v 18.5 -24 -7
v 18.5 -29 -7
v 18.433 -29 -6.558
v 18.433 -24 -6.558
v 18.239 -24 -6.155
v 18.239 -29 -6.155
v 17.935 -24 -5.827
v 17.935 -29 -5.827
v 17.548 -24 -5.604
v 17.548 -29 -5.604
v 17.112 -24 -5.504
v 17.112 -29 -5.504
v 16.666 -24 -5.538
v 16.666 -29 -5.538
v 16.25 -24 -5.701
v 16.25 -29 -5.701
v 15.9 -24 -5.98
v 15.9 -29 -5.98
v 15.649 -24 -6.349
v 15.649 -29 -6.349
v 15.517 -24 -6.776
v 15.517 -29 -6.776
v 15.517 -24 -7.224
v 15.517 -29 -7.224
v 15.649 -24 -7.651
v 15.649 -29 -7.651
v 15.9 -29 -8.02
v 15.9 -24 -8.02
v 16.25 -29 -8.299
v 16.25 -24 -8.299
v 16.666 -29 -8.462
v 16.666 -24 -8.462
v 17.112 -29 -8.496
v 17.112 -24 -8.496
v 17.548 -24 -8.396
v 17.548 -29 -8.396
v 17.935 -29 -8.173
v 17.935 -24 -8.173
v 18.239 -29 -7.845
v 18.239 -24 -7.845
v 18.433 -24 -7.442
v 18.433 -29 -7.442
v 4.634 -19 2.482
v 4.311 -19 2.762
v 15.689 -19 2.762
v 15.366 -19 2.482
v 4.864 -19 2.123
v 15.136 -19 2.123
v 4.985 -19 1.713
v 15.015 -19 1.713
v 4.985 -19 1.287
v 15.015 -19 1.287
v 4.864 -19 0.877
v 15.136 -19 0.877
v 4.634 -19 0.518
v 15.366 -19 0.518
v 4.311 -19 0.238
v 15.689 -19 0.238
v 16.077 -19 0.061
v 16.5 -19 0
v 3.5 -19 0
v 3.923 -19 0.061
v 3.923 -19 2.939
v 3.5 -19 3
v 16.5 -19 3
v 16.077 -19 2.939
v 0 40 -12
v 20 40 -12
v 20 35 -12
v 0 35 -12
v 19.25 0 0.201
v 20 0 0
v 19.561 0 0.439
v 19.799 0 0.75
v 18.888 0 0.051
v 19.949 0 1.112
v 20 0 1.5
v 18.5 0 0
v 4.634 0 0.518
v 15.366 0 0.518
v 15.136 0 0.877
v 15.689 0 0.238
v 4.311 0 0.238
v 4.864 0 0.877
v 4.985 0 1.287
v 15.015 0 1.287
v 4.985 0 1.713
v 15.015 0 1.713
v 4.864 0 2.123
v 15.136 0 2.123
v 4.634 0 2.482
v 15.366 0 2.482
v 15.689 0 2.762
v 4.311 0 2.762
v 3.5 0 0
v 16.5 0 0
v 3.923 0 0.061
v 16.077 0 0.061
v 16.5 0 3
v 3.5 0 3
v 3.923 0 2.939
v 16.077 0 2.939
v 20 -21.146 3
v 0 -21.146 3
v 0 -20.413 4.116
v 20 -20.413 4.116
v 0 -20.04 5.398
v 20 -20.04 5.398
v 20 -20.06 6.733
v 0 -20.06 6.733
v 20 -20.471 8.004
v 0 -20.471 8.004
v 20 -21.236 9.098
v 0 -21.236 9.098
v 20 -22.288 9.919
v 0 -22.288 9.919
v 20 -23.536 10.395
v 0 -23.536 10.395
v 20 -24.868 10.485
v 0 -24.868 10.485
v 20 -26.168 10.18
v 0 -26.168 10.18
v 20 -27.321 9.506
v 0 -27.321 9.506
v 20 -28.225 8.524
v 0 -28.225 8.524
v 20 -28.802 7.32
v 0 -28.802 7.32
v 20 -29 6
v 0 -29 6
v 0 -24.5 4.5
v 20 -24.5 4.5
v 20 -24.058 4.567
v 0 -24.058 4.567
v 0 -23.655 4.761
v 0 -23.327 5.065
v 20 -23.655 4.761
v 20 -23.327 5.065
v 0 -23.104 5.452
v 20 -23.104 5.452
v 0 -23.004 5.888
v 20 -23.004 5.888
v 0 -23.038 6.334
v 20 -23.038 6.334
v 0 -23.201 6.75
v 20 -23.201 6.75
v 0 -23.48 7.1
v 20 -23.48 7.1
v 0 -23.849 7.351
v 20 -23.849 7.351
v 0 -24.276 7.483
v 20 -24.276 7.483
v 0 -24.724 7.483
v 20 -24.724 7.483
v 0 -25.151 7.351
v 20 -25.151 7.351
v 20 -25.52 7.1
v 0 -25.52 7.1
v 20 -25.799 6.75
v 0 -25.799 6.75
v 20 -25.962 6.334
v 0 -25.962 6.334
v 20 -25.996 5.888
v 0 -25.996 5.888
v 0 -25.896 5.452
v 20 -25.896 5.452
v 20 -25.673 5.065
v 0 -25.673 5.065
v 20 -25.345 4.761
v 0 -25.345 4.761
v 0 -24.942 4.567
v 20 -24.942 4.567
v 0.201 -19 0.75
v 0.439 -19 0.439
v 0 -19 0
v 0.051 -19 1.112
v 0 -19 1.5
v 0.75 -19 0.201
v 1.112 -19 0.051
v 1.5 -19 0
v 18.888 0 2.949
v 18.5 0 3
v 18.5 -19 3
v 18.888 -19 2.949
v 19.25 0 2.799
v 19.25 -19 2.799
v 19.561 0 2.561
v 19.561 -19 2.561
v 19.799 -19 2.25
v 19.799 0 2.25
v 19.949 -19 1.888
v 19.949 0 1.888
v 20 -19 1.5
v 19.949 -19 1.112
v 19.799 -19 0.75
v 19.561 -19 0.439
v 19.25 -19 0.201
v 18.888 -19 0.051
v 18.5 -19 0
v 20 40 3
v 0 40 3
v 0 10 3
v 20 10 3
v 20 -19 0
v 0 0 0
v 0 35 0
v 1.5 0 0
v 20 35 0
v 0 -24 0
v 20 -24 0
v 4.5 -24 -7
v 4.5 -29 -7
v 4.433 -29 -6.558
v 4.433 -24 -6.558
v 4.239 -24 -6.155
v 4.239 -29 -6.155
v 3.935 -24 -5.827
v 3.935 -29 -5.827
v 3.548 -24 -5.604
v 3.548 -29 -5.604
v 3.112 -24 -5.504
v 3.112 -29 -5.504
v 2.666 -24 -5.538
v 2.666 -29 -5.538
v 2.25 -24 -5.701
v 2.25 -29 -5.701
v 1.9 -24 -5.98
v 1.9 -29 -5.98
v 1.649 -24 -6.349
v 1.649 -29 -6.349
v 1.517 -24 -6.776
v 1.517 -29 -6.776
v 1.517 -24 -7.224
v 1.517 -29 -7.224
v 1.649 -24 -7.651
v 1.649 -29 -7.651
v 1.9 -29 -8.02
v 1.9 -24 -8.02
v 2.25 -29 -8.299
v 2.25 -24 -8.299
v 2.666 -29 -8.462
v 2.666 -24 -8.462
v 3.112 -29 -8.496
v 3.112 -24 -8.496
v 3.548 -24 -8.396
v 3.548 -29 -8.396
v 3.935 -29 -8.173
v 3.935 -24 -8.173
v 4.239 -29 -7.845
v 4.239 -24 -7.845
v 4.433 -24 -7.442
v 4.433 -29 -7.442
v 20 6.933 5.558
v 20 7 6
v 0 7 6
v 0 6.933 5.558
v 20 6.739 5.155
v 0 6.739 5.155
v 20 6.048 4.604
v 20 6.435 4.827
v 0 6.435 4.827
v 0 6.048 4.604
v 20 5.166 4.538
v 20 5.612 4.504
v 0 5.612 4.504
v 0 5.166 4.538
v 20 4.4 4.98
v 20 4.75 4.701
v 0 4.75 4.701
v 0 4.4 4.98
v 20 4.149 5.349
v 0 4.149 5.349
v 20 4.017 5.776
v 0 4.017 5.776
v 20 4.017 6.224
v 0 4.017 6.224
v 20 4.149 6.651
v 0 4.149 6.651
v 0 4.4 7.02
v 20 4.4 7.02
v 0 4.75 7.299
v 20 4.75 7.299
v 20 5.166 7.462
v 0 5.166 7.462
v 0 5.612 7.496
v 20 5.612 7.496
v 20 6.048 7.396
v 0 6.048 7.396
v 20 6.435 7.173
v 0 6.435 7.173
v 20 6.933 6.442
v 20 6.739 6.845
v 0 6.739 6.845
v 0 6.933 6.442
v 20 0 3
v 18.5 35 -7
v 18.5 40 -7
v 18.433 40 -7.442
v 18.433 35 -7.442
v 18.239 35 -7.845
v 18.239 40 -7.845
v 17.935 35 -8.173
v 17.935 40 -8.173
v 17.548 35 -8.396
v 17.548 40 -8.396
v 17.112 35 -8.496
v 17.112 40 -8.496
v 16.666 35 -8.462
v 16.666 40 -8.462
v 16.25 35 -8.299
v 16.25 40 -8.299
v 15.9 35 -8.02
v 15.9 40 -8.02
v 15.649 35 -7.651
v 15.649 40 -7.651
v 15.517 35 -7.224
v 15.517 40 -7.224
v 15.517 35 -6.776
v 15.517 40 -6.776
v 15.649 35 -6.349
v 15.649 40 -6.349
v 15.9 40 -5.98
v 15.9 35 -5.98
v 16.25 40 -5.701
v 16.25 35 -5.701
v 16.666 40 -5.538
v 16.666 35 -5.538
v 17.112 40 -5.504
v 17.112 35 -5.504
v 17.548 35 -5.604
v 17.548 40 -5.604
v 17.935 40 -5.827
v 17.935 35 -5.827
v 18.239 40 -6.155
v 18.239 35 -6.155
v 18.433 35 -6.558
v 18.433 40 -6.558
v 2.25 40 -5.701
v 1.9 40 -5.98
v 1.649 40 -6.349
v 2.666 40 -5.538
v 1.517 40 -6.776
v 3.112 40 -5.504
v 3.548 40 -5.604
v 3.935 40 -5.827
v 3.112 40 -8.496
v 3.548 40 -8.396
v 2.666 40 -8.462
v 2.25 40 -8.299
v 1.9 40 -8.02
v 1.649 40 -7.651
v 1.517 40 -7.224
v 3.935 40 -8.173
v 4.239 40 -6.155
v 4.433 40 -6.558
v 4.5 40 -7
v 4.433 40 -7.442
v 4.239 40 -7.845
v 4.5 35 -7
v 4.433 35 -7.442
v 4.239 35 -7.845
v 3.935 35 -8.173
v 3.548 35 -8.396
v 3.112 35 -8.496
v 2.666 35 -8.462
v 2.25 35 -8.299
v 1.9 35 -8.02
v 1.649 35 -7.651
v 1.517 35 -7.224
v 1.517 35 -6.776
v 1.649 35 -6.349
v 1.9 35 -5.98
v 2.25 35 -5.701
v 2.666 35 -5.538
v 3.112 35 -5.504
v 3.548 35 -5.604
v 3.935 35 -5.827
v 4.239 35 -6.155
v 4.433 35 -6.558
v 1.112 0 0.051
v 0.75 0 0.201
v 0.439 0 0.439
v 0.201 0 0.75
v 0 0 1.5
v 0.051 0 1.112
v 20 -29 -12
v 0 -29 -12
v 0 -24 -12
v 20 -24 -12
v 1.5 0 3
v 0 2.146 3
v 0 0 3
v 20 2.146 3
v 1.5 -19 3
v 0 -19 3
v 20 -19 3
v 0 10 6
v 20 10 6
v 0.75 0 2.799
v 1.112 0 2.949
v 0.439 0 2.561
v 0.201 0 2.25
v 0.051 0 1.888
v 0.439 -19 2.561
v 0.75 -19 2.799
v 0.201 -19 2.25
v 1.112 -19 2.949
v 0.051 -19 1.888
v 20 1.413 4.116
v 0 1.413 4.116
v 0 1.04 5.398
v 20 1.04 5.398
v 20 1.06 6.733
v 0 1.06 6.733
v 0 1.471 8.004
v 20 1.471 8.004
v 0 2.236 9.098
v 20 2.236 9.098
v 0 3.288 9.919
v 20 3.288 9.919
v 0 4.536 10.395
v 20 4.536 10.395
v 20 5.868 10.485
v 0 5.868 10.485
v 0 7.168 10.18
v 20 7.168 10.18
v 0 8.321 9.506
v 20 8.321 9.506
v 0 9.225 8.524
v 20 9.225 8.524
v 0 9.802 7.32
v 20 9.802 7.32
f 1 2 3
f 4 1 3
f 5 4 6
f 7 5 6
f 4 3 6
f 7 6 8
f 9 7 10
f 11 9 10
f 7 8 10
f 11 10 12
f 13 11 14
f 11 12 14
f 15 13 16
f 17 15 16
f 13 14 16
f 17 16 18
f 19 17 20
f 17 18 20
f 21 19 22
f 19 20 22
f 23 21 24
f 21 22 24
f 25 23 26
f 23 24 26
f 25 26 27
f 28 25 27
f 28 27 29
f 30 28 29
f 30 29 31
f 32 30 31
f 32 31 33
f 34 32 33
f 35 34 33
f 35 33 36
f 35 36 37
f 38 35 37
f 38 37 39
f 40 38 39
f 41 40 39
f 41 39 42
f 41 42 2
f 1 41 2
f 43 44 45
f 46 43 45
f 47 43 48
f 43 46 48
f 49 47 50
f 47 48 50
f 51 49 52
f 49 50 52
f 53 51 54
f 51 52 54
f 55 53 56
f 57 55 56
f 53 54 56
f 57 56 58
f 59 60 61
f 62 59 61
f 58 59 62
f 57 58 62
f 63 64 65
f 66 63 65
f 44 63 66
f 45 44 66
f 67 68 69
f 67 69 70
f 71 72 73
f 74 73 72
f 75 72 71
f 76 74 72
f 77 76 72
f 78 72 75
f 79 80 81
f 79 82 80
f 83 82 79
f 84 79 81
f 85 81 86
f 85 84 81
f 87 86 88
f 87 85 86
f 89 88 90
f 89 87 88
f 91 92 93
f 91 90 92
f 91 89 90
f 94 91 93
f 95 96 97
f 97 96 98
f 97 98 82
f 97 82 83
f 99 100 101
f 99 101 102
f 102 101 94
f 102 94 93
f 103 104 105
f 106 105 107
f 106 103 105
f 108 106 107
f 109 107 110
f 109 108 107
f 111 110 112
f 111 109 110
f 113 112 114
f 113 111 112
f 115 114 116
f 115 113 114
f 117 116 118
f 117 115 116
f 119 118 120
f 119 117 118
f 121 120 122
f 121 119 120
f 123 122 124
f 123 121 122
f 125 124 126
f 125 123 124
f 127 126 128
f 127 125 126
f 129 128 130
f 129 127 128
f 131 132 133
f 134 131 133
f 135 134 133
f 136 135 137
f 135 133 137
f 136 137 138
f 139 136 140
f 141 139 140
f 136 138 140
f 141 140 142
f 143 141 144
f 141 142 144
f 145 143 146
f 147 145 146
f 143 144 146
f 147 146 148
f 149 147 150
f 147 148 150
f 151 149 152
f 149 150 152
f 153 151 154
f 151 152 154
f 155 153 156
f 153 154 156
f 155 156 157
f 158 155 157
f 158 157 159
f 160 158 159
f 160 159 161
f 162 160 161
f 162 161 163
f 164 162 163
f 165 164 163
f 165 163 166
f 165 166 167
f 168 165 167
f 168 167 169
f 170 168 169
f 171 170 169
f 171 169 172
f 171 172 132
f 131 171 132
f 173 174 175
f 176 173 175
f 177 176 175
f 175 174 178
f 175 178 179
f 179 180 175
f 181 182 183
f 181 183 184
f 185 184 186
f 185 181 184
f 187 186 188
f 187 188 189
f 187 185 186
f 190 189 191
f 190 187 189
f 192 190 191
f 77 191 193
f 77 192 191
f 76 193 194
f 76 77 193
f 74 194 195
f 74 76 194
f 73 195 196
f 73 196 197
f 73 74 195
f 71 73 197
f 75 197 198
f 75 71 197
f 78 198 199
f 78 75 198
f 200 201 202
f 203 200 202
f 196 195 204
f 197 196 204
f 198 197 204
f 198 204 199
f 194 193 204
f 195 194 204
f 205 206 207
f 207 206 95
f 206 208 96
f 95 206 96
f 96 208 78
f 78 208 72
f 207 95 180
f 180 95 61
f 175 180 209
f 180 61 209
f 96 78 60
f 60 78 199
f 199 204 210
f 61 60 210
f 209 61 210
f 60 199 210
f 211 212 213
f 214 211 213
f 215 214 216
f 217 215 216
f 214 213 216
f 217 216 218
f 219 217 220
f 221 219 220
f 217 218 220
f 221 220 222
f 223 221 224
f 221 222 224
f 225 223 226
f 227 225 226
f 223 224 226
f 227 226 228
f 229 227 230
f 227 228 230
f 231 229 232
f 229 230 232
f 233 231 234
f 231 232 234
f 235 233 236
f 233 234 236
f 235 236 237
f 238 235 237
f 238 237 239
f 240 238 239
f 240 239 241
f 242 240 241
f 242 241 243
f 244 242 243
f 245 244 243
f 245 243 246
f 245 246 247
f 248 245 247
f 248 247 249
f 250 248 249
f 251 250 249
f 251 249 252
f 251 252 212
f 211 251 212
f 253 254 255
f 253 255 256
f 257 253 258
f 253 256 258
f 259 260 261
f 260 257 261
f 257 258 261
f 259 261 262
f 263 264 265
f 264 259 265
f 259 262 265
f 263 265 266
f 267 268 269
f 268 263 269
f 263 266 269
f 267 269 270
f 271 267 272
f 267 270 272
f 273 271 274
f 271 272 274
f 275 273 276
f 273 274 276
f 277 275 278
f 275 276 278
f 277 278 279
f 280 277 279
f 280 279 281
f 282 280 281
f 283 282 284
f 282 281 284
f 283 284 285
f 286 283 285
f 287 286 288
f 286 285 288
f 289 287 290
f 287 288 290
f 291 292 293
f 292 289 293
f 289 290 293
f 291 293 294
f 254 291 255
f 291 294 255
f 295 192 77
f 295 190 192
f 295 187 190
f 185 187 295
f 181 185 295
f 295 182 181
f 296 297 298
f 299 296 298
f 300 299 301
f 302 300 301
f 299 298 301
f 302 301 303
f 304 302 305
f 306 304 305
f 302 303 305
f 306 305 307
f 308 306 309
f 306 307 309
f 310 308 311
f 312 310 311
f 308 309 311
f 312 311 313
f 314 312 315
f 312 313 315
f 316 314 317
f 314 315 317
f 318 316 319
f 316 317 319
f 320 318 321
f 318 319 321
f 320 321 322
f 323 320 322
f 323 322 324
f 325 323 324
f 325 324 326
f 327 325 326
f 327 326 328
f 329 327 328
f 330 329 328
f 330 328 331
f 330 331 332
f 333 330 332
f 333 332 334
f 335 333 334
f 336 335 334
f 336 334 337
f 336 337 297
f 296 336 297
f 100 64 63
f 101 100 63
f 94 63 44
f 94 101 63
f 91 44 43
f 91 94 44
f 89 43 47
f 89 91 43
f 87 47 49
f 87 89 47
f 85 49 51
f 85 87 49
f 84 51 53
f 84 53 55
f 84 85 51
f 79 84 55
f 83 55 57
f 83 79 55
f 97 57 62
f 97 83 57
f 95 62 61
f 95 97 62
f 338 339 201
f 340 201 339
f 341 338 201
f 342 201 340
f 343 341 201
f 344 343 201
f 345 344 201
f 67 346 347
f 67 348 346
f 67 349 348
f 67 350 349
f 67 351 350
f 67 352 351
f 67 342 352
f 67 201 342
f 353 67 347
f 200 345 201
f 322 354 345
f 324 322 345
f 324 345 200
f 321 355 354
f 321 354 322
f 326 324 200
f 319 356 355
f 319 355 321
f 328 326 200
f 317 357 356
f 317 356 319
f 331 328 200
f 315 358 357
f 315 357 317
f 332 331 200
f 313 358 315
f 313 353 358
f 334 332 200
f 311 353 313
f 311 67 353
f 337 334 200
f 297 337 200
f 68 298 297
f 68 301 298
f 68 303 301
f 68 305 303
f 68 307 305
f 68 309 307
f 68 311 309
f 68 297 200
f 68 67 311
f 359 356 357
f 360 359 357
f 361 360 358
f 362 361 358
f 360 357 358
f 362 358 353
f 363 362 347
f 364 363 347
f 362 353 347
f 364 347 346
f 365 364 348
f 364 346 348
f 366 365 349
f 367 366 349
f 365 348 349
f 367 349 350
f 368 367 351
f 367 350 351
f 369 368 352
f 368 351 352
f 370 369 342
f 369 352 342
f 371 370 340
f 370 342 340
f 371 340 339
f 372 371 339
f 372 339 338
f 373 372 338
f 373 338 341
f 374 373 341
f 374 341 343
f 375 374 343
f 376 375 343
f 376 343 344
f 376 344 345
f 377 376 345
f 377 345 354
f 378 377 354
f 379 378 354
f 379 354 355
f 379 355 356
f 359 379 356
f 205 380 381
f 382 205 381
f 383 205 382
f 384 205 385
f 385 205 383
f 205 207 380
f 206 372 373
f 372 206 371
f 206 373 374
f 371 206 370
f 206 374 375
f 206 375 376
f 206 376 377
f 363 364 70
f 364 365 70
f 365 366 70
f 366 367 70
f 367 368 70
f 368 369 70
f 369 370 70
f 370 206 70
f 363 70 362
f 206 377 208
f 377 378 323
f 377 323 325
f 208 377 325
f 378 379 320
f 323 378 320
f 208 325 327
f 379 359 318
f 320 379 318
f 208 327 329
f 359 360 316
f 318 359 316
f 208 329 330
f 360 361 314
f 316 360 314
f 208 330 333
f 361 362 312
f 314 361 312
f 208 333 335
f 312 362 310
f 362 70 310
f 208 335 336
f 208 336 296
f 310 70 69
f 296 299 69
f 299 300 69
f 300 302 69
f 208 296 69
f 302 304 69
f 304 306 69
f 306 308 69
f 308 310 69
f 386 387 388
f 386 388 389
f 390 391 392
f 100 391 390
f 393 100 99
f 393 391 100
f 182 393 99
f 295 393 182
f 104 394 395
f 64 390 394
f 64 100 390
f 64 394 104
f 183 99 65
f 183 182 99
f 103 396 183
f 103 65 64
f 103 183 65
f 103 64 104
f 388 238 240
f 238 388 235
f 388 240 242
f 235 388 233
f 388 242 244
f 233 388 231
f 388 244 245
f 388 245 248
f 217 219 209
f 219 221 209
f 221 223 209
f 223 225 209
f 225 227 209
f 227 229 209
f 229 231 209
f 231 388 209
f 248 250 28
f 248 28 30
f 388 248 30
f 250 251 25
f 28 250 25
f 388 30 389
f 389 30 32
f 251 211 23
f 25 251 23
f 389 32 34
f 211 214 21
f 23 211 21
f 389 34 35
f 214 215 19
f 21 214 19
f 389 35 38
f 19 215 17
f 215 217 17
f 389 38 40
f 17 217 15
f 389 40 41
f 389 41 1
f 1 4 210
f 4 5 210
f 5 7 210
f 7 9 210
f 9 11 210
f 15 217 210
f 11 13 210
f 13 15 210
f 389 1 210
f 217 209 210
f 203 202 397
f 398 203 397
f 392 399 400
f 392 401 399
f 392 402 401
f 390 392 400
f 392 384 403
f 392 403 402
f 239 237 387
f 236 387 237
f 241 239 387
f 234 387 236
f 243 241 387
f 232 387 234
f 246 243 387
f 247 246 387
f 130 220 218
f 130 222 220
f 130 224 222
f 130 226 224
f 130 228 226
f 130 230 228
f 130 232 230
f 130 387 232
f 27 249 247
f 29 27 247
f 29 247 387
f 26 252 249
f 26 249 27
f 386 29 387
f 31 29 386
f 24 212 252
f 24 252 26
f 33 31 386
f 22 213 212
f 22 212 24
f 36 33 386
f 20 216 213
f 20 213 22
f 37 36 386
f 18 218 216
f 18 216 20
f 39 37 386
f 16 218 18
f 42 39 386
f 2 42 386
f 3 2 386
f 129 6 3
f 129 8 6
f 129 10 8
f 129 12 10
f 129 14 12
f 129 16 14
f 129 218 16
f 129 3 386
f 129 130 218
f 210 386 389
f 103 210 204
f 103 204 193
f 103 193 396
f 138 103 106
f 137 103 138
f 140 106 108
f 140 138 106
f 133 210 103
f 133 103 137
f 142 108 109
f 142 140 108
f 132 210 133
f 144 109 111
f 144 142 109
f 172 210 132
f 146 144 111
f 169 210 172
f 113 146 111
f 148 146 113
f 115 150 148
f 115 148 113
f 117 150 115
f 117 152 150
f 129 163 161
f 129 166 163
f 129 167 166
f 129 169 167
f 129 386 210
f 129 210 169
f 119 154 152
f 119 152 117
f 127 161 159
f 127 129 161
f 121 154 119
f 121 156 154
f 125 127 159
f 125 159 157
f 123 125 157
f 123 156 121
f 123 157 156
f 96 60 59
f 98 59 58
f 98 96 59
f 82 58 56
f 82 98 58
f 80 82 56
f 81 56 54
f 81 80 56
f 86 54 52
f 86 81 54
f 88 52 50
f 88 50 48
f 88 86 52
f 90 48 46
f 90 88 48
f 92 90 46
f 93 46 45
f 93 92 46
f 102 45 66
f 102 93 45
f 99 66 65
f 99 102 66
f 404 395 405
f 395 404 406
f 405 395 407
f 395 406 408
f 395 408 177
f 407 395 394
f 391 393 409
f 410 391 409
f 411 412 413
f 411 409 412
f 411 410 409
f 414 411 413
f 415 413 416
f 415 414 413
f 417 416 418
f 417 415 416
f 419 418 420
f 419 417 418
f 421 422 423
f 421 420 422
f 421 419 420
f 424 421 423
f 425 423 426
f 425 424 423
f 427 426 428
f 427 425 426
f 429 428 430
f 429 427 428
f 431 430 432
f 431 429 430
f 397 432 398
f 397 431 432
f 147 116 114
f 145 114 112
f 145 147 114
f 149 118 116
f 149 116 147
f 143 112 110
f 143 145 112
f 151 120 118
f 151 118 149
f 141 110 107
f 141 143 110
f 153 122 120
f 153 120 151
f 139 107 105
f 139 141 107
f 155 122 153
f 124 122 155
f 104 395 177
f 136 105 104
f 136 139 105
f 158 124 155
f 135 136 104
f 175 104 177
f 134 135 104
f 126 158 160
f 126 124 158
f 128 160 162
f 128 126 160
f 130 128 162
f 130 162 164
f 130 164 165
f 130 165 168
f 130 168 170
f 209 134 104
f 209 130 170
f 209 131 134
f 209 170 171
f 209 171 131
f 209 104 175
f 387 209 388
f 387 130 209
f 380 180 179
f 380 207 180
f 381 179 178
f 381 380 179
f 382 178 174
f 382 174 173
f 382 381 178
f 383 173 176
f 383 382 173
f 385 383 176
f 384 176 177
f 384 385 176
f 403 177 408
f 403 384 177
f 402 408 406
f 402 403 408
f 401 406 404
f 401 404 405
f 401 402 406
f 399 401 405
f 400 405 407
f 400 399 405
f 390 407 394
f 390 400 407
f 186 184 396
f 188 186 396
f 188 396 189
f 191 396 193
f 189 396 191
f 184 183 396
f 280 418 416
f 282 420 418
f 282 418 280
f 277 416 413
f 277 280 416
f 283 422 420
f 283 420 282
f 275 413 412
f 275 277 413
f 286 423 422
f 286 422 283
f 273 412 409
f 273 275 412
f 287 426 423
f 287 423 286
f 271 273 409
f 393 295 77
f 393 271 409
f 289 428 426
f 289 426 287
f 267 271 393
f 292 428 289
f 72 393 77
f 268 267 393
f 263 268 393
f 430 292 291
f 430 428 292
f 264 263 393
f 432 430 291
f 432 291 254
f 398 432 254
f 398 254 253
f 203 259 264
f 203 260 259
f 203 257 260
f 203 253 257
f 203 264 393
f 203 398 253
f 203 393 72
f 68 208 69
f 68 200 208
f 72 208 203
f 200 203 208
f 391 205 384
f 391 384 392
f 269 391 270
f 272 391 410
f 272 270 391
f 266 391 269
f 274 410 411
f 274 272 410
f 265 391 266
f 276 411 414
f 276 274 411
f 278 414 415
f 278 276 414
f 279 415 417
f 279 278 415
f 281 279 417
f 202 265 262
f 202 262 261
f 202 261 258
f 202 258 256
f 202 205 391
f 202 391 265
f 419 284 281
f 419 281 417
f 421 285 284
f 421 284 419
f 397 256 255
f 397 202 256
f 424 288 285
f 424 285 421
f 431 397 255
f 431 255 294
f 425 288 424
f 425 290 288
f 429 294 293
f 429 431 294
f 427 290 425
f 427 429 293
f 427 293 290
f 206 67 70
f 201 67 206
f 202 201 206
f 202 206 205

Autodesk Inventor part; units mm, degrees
ref_plane "YZ Plane" through (0, 0, 0) normal (1, 0, 0) x (0, 1, 0)
ref_plane "XZ Plane" through (0, 0, 0) normal (0, 1, 0) x (-1, 0, 0)
ref_plane "XY Plane" through (0, 0, 0) normal (0, 0, 1) x (1, 0, 0)
sketch "Sketch1" plane through (0, 0, 0) normal (1, 0, 0) x (0, 1, 0)
  line L0 (40, 0) -> (40, 3)
  line L1 (40, 3) -> (10, 3)
  line L2 (10, 3) -> (10, 6)
  arc A0 (10, 6) -> (2.1459, 3) centre (5.5, 6) ccw
  line L3 (0, 0) -> (0, 3)
  line L4 (0, 3) -> (2.1459, 3)
  line L5 (40, 0) -> (0, 0)
  circle A1 centre (5.5, 6) radius 1.5
  dimension "d7" = 3
extrude "Extrusion1" add sketch "Sketch1" along normal blind 20
sketch "Sketch2" plane through (0, 0, 0) normal (0, -1, 0) x (1, 0, 0)
  line L0 (0, 0) -> (20, 0) projected
  line L1 (18.5, 0) -> (16.5, 0)
  line L2 (15, 1.5) -> (15, 1.5)
  line L3 (0, 3) -> (20, 3) projected
  line L4 (16.5, 3) -> (18.5, 3)
  line L5 (20, 1.5) -> (20, 1.5)
  arc A0 (20, 1.5) -> (18.5, 3) centre (18.5, 1.5) ccw
  arc A1 (18.5, 0) -> (20, 1.5) centre (18.5, 1.5) ccw
  arc A2 (16.5, 3) -> (15, 1.5) centre (16.5, 1.5) ccw
  arc A3 (15, 1.5) -> (16.5, 0) centre (16.5, 1.5) ccw
  line L6 (0, 6) -> (0, 3) projected
  line L7 (1.5, 3) -> (3.5, 3)
  line L8 (5, 1.5) -> (5, 1.5)
  line L9 (3.5, 0) -> (1.5, 0)
  line L10 (0, 0) -> (0, 3) projected
  line L11 (0, 1.5) -> (0, 1.5)
  arc A4 (5, 1.5) -> (3.5, 3) centre (3.5, 1.5) ccw
  arc A5 (3.5, 0) -> (5, 1.5) centre (3.5, 1.5) ccw
  arc A6 (1.5, 3) -> (0, 1.5) centre (1.5, 1.5) ccw
  arc A7 (0, 1.5) -> (1.5, 0) centre (1.5, 1.5) ccw
  point P0 (15, 0)
  point P1 (15, 3)
  point P2 (5, 3)
  point P3 (5, 0)
  dimension "d10" = 5
  dimension "d11" = 3
  dimension "d12" = 5
  dimension "d13" = 3
  dimension "d14" = 1.5
  dimension "d15" = 5
  dimension "d16" = 3
  dimension "d17" = 5
  dimension "d18" = 3
  dimension "d19" = 1.5
extrude "Extrusion2" add sketch "Sketch2" along normal blind 19 contours A7 A6 L3 A4 A5 L0 | A3 A2 L3 A0 A1 L0
ref_plane "Work Plane1" through (18.5, -19, 3) normal (0, -1, 0) x (1, 0, 0)
sketch "Sketch4" plane through (20, 0, 0) normal (1, 0, 0) x (0, 0, -1)
  line L0 (-3, -19) -> (0, -19) projected
  line L1 (0, -19) -> (0, -29)
  line L2 (0, -29) -> (-6, -29)
  arc A0 (-3, -21.1459) -> (-6, -29) centre (-6, -24.5) ccw
  line L3 (-3, -19) -> (-3, -21.1459)
  circle A1 centre (-6, -24.5) radius 1.5
  point P0 (0, 0)
  dimension "d31" = 3
extrude "Extrusion3" add sketch "Sketch4" against normal blind 20
sketch "Sketch5" plane through (0, 40, 3) normal (0, 1, 0) x (1, 0, 0)
  line L0 (0, 3) -> (20, 3) projected
  line L1 (20, 3) -> (20, 15)
  line L2 (20, 15) -> (0, 15)
  line L3 (0, 0) -> (0, 3) projected
  line L4 (0, 15) -> (0, 3)
  line L5 (0, 3) -> (20, 3)
  circle A0 centre (17, 10) radius 1.5
  circle A1 centre (3, 10) radius 1.5
  dimension "d34" = 12
  dimension "d35" = 20
  dimension "d36" = 12
  dimension "d37" = 20
  dimension "d40" = 3
  dimension "d43" = 3
extrude "Extrusion4" add sketch "Sketch5" against normal blind 5
sketch "Sketch6" plane through (20, -29, 0) normal (0, -1, 0) x (1, 0, 0)
  line L0 (-20, 0) -> (-20, -12) projected
  line L1 (-20, 0) -> (-20, -12)
  line L2 (-20, -12) -> (0, -12)
  line L3 (-1.5, 0) -> (0, 0) projected
  line L4 (0, -12) -> (0, 0)
  line L5 (0, 0) -> (-20, 0)
  line L6 (-16.5, 0) -> (-3.5, 0) projected
  circle A0 centre (-17, -7) radius 1.5 projected
  circle A1 centre (-17, -7) radius 1.5
  circle A2 centre (-3, -7) radius 1.5 projected
  circle A3 centre (-3, -7) radius 1.5
  dimension "d46" = 12
  dimension "d47" = 20
  dimension "d48" = 12
  dimension "d49" = 20
  dimension "d50" = 3
  dimension "d51" = 3
extrude "Extrusion5" add sketch "Sketch6" against normal blind 5
